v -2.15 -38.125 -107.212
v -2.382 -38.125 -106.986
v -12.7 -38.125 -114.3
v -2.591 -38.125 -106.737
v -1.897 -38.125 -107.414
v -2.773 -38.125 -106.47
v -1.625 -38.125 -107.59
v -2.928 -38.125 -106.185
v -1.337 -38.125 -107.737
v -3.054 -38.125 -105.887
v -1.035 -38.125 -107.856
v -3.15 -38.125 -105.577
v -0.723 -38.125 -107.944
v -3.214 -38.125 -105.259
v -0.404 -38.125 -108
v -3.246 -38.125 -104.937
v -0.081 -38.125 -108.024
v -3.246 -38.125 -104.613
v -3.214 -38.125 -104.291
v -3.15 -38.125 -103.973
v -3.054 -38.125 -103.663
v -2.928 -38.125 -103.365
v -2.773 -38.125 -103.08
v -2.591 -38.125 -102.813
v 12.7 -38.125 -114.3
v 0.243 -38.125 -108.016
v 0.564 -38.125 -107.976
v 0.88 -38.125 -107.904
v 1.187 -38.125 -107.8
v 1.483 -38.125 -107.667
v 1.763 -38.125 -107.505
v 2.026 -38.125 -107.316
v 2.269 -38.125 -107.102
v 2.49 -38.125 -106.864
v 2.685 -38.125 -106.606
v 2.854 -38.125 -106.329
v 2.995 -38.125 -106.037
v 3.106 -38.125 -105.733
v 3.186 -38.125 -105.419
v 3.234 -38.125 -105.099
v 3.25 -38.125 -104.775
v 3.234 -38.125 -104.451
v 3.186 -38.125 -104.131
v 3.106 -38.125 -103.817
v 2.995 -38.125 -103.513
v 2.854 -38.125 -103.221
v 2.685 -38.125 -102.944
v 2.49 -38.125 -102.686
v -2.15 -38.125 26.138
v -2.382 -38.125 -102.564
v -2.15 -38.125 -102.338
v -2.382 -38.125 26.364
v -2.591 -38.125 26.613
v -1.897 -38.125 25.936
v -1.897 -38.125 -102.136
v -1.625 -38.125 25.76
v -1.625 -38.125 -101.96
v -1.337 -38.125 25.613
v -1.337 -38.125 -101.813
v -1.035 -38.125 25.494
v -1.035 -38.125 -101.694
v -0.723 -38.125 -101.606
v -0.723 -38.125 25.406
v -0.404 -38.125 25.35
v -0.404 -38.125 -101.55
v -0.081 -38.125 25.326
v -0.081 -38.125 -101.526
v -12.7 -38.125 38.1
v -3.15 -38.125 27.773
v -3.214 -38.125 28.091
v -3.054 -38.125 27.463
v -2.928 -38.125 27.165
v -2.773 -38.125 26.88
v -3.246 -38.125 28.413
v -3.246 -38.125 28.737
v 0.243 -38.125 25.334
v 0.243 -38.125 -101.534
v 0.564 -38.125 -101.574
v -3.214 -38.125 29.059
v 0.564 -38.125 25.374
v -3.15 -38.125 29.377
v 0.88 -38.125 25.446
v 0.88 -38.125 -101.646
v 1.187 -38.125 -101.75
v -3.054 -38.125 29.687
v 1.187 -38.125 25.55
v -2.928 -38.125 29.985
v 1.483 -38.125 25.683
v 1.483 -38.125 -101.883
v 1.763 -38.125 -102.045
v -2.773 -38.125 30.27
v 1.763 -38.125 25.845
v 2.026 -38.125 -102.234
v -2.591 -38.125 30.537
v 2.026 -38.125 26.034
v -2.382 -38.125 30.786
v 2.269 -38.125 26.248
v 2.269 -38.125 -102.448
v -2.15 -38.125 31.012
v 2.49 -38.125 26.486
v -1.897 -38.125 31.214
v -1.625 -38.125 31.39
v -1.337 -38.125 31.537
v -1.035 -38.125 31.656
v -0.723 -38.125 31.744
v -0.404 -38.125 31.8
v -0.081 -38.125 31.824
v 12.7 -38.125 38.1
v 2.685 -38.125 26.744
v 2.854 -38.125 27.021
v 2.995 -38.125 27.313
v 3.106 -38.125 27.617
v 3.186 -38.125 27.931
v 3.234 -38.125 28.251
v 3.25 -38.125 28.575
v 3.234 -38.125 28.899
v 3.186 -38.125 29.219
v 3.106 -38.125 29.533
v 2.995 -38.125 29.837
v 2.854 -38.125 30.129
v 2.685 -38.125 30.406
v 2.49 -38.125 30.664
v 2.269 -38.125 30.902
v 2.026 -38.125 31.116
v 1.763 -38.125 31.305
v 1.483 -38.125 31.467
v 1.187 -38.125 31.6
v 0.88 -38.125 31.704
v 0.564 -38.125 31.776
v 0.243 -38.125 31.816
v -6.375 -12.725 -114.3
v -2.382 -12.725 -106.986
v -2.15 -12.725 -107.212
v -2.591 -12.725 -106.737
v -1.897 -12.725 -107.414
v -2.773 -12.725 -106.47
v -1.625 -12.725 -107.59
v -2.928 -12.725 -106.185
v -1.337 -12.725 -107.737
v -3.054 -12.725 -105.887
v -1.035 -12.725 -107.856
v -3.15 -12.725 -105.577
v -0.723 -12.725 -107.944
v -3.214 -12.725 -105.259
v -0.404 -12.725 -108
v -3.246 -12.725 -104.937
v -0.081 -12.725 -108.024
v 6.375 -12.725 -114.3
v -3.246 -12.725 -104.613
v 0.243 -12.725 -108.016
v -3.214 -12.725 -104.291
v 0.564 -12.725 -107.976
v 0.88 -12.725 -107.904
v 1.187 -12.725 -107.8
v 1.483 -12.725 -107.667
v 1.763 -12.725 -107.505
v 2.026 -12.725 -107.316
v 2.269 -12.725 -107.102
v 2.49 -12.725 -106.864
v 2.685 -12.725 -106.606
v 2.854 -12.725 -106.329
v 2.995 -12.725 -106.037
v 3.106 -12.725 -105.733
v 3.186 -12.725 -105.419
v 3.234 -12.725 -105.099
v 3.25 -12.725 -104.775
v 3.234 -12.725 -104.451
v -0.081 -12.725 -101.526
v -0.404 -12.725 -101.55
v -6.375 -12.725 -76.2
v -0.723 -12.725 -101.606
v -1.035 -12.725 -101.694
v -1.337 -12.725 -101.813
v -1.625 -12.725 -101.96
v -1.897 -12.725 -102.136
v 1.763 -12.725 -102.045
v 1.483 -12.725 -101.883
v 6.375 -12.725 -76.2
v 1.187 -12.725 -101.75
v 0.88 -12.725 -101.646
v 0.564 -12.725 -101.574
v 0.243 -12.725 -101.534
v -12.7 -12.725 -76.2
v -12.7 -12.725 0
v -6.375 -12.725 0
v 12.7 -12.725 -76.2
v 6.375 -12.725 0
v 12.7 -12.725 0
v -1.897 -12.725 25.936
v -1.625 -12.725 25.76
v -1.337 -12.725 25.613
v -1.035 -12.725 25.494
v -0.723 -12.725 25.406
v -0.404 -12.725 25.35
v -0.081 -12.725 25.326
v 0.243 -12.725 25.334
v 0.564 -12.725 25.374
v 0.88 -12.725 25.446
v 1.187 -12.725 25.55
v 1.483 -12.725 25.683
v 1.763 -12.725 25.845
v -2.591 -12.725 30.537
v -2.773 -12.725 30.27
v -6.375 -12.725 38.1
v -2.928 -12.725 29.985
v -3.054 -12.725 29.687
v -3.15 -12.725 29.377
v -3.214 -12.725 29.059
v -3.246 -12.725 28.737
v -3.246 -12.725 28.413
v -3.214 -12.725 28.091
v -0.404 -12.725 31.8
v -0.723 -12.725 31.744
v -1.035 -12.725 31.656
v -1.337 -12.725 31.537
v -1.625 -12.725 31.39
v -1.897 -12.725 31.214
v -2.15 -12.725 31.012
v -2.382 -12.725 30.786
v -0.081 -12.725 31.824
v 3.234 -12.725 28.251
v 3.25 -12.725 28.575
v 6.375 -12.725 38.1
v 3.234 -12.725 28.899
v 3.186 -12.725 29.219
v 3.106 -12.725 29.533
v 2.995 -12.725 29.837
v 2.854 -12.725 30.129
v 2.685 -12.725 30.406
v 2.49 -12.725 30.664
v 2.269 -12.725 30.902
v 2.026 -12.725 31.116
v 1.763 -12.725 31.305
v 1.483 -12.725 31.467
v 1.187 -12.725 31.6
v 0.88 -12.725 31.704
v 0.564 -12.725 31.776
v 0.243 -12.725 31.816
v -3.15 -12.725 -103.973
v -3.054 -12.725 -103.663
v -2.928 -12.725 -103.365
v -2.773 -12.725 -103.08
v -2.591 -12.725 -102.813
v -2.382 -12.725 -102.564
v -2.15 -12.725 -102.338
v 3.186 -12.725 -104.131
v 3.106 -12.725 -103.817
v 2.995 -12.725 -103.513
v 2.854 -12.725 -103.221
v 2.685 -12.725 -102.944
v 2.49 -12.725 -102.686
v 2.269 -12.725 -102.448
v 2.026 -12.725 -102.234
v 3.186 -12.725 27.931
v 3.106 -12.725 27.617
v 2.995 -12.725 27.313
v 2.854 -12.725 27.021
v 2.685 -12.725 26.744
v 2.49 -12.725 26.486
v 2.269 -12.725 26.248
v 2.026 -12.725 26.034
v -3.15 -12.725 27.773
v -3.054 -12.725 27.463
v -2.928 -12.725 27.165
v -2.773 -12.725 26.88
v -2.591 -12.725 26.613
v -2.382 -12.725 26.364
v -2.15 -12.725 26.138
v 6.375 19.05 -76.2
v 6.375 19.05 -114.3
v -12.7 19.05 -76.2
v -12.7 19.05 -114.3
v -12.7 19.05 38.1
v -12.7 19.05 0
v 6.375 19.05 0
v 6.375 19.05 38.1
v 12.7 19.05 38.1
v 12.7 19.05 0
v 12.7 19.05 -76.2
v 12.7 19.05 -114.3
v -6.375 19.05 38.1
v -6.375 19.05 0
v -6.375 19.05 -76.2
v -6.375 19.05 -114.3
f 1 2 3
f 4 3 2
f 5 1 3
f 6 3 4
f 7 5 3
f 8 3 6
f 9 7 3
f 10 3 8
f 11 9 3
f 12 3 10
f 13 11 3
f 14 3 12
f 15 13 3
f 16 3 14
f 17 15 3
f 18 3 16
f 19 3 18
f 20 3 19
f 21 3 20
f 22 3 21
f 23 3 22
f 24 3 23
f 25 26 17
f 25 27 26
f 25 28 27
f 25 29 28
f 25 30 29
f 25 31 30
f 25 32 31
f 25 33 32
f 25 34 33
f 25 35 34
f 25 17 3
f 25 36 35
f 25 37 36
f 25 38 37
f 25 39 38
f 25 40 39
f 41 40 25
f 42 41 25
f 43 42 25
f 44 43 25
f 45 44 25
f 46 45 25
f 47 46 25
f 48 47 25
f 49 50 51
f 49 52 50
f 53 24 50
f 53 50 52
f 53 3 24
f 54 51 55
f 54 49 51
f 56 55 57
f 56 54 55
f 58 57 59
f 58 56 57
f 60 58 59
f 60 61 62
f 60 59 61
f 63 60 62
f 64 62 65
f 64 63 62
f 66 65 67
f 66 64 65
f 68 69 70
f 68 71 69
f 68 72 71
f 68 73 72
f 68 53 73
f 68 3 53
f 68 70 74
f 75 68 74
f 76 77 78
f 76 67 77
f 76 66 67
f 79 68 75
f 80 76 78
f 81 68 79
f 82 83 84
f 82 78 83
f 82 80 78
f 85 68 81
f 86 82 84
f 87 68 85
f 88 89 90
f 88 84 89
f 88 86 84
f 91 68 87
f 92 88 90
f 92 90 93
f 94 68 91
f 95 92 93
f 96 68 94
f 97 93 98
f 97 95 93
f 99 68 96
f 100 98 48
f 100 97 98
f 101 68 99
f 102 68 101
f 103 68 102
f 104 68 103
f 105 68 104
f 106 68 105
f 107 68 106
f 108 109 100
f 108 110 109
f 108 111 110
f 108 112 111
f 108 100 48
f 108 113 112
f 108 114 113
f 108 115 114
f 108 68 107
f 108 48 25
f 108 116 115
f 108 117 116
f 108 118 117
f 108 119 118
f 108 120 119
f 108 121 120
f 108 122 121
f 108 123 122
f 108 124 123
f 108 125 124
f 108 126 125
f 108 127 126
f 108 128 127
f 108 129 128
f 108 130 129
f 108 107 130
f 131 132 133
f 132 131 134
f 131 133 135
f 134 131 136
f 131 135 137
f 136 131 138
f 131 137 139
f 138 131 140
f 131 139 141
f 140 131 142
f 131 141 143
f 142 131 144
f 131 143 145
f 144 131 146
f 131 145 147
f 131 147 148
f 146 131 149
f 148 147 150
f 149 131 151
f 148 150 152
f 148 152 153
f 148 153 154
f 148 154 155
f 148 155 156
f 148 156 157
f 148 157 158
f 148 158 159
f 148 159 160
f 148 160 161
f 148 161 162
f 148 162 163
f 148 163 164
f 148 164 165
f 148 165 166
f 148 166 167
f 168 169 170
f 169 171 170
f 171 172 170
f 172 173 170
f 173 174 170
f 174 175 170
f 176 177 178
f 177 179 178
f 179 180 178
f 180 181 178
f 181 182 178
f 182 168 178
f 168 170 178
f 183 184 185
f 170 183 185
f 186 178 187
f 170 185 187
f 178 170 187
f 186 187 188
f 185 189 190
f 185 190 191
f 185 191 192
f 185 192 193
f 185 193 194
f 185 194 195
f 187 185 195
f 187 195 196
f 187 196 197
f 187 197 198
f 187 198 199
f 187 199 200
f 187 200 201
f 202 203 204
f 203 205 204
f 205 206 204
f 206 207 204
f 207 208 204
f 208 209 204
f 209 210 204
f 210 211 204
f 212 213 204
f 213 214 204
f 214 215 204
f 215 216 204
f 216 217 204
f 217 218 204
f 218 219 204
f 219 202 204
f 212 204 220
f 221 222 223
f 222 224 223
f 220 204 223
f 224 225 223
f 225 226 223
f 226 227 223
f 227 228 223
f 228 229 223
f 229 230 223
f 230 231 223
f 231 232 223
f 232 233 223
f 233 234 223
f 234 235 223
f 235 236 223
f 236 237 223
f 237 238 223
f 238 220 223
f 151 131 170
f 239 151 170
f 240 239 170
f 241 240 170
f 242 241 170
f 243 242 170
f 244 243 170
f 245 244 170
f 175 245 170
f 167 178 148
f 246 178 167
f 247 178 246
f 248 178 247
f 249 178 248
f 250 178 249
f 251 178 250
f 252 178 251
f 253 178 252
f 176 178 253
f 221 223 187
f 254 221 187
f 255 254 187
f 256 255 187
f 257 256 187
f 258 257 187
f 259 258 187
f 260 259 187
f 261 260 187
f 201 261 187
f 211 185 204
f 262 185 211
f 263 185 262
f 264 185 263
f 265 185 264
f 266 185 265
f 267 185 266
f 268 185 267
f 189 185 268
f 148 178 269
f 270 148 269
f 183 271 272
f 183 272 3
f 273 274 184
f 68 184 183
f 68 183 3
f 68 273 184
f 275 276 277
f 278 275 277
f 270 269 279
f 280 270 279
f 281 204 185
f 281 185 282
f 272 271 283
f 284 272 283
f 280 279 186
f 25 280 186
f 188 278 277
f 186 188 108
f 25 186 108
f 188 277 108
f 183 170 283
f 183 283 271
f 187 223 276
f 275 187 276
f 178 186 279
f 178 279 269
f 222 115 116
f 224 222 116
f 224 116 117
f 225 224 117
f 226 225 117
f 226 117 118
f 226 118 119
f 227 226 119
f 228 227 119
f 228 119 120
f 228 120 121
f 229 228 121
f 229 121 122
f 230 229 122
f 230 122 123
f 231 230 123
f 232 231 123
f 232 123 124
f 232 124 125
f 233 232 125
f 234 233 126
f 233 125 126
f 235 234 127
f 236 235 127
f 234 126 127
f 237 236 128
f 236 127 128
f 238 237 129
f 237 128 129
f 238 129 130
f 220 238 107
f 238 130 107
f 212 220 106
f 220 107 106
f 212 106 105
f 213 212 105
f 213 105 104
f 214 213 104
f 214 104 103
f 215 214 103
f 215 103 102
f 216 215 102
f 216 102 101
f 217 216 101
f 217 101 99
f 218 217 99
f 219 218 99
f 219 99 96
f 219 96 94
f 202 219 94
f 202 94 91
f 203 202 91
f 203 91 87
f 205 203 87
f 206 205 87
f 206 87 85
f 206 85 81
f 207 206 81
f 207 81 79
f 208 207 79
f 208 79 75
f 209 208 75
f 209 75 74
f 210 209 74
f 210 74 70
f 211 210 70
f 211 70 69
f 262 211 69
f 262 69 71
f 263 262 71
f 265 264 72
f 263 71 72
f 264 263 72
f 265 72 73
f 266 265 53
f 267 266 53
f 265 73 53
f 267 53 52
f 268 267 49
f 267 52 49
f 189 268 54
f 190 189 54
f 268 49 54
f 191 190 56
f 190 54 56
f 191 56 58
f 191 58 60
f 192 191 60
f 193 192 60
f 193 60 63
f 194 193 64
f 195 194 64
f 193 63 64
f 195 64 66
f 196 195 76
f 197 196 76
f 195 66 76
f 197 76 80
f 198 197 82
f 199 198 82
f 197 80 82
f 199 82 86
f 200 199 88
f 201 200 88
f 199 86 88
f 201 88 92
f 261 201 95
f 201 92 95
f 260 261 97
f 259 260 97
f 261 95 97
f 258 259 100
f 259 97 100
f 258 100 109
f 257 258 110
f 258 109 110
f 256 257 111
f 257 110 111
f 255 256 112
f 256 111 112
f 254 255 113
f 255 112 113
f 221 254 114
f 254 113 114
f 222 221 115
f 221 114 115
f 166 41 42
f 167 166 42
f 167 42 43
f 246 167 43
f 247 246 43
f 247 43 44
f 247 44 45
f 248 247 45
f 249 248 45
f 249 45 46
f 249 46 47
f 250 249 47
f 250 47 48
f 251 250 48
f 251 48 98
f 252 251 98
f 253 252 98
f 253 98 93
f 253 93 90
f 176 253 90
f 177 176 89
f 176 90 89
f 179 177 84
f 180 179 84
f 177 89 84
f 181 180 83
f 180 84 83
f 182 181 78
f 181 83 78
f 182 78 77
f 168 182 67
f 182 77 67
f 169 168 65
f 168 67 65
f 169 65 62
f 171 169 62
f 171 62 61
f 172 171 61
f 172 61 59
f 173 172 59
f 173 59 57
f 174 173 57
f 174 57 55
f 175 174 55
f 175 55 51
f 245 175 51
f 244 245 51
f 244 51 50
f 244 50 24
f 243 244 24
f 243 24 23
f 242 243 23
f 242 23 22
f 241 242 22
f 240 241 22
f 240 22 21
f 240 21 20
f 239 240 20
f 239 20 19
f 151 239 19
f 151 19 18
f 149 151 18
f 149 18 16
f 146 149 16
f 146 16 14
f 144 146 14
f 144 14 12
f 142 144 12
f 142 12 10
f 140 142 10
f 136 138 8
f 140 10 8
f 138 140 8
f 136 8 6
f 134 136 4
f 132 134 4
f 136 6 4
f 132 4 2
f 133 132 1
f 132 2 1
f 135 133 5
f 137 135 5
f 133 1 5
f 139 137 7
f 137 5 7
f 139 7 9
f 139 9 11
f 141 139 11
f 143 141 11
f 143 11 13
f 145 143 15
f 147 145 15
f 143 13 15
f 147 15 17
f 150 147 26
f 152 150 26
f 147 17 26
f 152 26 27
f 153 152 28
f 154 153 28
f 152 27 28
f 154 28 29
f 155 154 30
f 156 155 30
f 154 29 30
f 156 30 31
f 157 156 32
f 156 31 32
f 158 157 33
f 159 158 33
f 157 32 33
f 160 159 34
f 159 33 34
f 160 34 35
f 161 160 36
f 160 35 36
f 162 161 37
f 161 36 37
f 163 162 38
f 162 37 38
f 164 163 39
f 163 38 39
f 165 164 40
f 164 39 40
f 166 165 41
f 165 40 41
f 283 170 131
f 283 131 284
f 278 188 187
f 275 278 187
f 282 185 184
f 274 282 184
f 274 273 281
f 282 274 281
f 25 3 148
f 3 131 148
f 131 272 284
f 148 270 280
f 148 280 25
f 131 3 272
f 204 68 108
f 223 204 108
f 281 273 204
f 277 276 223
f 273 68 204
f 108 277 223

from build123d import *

# Parameters (mm, degrees)
F0_W     = 25.4
F0_H     = 38.1
F1_DEPTH = 38.1
F2_T     = -6.325
F3_DEPTH = 19.075
F4_DEPTH = 114.3
F6_D     = 6.5
F6_DEPTH = 50
F6_TIP   = 1.9527970118
F7_W     = 6.325
F7_H     = 76.2
F8_W     = 6.325
F8_H     = 76.2
F9_DEPTH = 31.775


with BuildPart() as f1:
    # F0 (on Top) → F1 (new body)
    with BuildSketch(Plane.XY):
        Rectangle(F0_W, F0_H)
    extrude(amount=F1_DEPTH)

    # F2
    f2_openings = [f1.faces().sort_by_distance(p)[0] for p in [
        (0, 19.05, 19.05),
        (0, 0, 38.1),
        (0, 0, 0),
    ]]
    offset(amount=F2_T, openings=f2_openings)

    # F3 (add): a face of the model
    f3_faces = [f1.faces().sort_by_distance(p)[0] for p in [
        (0, -19.05, 19.05),
    ]]
    extrude(f3_faces, amount=F3_DEPTH)

    # F4 (add): a face of the model
    f4_faces = [f1.faces().sort_by_distance(p)[0] for p in [
        (0, -14.4511656595, 0),
    ]]
    extrude(f4_faces, amount=F4_DEPTH)

    # F6
    with Locations(Plane(origin=(0, -12.725, 0), x_dir=(-1, 0, 0), z_dir=(0, 1, 0))):
        with Locations((0, -104.775), (0, 28.575)):
            Hole(F6_D / 2, depth=F6_DEPTH)
            with Locations((0, 0, -(F6_DEPTH + F6_TIP / 2))):  # 118° drill point
                Cone(0, F6_D / 2, F6_TIP, mode=Mode.SUBTRACT)

    # F7 (on face) + F8 (on face) → F9 (cut)
    with BuildSketch(Plane(origin=(0, 19.05, 0), x_dir=(-1, 0, 0), z_dir=(0, 1, 0))):
        with Locations((-9.5375, -38.1)):
            Rectangle(F7_W, F7_H)
    with BuildSketch(Plane(origin=(0, 19.05, 0), x_dir=(-1, 0, 0), z_dir=(0, 1, 0))):
        with Locations((9.5375, -38.1)):
            Rectangle(F8_W, F8_H)
    extrude(amount=-F9_DEPTH, mode=Mode.SUBTRACT)


solid = f1.part
